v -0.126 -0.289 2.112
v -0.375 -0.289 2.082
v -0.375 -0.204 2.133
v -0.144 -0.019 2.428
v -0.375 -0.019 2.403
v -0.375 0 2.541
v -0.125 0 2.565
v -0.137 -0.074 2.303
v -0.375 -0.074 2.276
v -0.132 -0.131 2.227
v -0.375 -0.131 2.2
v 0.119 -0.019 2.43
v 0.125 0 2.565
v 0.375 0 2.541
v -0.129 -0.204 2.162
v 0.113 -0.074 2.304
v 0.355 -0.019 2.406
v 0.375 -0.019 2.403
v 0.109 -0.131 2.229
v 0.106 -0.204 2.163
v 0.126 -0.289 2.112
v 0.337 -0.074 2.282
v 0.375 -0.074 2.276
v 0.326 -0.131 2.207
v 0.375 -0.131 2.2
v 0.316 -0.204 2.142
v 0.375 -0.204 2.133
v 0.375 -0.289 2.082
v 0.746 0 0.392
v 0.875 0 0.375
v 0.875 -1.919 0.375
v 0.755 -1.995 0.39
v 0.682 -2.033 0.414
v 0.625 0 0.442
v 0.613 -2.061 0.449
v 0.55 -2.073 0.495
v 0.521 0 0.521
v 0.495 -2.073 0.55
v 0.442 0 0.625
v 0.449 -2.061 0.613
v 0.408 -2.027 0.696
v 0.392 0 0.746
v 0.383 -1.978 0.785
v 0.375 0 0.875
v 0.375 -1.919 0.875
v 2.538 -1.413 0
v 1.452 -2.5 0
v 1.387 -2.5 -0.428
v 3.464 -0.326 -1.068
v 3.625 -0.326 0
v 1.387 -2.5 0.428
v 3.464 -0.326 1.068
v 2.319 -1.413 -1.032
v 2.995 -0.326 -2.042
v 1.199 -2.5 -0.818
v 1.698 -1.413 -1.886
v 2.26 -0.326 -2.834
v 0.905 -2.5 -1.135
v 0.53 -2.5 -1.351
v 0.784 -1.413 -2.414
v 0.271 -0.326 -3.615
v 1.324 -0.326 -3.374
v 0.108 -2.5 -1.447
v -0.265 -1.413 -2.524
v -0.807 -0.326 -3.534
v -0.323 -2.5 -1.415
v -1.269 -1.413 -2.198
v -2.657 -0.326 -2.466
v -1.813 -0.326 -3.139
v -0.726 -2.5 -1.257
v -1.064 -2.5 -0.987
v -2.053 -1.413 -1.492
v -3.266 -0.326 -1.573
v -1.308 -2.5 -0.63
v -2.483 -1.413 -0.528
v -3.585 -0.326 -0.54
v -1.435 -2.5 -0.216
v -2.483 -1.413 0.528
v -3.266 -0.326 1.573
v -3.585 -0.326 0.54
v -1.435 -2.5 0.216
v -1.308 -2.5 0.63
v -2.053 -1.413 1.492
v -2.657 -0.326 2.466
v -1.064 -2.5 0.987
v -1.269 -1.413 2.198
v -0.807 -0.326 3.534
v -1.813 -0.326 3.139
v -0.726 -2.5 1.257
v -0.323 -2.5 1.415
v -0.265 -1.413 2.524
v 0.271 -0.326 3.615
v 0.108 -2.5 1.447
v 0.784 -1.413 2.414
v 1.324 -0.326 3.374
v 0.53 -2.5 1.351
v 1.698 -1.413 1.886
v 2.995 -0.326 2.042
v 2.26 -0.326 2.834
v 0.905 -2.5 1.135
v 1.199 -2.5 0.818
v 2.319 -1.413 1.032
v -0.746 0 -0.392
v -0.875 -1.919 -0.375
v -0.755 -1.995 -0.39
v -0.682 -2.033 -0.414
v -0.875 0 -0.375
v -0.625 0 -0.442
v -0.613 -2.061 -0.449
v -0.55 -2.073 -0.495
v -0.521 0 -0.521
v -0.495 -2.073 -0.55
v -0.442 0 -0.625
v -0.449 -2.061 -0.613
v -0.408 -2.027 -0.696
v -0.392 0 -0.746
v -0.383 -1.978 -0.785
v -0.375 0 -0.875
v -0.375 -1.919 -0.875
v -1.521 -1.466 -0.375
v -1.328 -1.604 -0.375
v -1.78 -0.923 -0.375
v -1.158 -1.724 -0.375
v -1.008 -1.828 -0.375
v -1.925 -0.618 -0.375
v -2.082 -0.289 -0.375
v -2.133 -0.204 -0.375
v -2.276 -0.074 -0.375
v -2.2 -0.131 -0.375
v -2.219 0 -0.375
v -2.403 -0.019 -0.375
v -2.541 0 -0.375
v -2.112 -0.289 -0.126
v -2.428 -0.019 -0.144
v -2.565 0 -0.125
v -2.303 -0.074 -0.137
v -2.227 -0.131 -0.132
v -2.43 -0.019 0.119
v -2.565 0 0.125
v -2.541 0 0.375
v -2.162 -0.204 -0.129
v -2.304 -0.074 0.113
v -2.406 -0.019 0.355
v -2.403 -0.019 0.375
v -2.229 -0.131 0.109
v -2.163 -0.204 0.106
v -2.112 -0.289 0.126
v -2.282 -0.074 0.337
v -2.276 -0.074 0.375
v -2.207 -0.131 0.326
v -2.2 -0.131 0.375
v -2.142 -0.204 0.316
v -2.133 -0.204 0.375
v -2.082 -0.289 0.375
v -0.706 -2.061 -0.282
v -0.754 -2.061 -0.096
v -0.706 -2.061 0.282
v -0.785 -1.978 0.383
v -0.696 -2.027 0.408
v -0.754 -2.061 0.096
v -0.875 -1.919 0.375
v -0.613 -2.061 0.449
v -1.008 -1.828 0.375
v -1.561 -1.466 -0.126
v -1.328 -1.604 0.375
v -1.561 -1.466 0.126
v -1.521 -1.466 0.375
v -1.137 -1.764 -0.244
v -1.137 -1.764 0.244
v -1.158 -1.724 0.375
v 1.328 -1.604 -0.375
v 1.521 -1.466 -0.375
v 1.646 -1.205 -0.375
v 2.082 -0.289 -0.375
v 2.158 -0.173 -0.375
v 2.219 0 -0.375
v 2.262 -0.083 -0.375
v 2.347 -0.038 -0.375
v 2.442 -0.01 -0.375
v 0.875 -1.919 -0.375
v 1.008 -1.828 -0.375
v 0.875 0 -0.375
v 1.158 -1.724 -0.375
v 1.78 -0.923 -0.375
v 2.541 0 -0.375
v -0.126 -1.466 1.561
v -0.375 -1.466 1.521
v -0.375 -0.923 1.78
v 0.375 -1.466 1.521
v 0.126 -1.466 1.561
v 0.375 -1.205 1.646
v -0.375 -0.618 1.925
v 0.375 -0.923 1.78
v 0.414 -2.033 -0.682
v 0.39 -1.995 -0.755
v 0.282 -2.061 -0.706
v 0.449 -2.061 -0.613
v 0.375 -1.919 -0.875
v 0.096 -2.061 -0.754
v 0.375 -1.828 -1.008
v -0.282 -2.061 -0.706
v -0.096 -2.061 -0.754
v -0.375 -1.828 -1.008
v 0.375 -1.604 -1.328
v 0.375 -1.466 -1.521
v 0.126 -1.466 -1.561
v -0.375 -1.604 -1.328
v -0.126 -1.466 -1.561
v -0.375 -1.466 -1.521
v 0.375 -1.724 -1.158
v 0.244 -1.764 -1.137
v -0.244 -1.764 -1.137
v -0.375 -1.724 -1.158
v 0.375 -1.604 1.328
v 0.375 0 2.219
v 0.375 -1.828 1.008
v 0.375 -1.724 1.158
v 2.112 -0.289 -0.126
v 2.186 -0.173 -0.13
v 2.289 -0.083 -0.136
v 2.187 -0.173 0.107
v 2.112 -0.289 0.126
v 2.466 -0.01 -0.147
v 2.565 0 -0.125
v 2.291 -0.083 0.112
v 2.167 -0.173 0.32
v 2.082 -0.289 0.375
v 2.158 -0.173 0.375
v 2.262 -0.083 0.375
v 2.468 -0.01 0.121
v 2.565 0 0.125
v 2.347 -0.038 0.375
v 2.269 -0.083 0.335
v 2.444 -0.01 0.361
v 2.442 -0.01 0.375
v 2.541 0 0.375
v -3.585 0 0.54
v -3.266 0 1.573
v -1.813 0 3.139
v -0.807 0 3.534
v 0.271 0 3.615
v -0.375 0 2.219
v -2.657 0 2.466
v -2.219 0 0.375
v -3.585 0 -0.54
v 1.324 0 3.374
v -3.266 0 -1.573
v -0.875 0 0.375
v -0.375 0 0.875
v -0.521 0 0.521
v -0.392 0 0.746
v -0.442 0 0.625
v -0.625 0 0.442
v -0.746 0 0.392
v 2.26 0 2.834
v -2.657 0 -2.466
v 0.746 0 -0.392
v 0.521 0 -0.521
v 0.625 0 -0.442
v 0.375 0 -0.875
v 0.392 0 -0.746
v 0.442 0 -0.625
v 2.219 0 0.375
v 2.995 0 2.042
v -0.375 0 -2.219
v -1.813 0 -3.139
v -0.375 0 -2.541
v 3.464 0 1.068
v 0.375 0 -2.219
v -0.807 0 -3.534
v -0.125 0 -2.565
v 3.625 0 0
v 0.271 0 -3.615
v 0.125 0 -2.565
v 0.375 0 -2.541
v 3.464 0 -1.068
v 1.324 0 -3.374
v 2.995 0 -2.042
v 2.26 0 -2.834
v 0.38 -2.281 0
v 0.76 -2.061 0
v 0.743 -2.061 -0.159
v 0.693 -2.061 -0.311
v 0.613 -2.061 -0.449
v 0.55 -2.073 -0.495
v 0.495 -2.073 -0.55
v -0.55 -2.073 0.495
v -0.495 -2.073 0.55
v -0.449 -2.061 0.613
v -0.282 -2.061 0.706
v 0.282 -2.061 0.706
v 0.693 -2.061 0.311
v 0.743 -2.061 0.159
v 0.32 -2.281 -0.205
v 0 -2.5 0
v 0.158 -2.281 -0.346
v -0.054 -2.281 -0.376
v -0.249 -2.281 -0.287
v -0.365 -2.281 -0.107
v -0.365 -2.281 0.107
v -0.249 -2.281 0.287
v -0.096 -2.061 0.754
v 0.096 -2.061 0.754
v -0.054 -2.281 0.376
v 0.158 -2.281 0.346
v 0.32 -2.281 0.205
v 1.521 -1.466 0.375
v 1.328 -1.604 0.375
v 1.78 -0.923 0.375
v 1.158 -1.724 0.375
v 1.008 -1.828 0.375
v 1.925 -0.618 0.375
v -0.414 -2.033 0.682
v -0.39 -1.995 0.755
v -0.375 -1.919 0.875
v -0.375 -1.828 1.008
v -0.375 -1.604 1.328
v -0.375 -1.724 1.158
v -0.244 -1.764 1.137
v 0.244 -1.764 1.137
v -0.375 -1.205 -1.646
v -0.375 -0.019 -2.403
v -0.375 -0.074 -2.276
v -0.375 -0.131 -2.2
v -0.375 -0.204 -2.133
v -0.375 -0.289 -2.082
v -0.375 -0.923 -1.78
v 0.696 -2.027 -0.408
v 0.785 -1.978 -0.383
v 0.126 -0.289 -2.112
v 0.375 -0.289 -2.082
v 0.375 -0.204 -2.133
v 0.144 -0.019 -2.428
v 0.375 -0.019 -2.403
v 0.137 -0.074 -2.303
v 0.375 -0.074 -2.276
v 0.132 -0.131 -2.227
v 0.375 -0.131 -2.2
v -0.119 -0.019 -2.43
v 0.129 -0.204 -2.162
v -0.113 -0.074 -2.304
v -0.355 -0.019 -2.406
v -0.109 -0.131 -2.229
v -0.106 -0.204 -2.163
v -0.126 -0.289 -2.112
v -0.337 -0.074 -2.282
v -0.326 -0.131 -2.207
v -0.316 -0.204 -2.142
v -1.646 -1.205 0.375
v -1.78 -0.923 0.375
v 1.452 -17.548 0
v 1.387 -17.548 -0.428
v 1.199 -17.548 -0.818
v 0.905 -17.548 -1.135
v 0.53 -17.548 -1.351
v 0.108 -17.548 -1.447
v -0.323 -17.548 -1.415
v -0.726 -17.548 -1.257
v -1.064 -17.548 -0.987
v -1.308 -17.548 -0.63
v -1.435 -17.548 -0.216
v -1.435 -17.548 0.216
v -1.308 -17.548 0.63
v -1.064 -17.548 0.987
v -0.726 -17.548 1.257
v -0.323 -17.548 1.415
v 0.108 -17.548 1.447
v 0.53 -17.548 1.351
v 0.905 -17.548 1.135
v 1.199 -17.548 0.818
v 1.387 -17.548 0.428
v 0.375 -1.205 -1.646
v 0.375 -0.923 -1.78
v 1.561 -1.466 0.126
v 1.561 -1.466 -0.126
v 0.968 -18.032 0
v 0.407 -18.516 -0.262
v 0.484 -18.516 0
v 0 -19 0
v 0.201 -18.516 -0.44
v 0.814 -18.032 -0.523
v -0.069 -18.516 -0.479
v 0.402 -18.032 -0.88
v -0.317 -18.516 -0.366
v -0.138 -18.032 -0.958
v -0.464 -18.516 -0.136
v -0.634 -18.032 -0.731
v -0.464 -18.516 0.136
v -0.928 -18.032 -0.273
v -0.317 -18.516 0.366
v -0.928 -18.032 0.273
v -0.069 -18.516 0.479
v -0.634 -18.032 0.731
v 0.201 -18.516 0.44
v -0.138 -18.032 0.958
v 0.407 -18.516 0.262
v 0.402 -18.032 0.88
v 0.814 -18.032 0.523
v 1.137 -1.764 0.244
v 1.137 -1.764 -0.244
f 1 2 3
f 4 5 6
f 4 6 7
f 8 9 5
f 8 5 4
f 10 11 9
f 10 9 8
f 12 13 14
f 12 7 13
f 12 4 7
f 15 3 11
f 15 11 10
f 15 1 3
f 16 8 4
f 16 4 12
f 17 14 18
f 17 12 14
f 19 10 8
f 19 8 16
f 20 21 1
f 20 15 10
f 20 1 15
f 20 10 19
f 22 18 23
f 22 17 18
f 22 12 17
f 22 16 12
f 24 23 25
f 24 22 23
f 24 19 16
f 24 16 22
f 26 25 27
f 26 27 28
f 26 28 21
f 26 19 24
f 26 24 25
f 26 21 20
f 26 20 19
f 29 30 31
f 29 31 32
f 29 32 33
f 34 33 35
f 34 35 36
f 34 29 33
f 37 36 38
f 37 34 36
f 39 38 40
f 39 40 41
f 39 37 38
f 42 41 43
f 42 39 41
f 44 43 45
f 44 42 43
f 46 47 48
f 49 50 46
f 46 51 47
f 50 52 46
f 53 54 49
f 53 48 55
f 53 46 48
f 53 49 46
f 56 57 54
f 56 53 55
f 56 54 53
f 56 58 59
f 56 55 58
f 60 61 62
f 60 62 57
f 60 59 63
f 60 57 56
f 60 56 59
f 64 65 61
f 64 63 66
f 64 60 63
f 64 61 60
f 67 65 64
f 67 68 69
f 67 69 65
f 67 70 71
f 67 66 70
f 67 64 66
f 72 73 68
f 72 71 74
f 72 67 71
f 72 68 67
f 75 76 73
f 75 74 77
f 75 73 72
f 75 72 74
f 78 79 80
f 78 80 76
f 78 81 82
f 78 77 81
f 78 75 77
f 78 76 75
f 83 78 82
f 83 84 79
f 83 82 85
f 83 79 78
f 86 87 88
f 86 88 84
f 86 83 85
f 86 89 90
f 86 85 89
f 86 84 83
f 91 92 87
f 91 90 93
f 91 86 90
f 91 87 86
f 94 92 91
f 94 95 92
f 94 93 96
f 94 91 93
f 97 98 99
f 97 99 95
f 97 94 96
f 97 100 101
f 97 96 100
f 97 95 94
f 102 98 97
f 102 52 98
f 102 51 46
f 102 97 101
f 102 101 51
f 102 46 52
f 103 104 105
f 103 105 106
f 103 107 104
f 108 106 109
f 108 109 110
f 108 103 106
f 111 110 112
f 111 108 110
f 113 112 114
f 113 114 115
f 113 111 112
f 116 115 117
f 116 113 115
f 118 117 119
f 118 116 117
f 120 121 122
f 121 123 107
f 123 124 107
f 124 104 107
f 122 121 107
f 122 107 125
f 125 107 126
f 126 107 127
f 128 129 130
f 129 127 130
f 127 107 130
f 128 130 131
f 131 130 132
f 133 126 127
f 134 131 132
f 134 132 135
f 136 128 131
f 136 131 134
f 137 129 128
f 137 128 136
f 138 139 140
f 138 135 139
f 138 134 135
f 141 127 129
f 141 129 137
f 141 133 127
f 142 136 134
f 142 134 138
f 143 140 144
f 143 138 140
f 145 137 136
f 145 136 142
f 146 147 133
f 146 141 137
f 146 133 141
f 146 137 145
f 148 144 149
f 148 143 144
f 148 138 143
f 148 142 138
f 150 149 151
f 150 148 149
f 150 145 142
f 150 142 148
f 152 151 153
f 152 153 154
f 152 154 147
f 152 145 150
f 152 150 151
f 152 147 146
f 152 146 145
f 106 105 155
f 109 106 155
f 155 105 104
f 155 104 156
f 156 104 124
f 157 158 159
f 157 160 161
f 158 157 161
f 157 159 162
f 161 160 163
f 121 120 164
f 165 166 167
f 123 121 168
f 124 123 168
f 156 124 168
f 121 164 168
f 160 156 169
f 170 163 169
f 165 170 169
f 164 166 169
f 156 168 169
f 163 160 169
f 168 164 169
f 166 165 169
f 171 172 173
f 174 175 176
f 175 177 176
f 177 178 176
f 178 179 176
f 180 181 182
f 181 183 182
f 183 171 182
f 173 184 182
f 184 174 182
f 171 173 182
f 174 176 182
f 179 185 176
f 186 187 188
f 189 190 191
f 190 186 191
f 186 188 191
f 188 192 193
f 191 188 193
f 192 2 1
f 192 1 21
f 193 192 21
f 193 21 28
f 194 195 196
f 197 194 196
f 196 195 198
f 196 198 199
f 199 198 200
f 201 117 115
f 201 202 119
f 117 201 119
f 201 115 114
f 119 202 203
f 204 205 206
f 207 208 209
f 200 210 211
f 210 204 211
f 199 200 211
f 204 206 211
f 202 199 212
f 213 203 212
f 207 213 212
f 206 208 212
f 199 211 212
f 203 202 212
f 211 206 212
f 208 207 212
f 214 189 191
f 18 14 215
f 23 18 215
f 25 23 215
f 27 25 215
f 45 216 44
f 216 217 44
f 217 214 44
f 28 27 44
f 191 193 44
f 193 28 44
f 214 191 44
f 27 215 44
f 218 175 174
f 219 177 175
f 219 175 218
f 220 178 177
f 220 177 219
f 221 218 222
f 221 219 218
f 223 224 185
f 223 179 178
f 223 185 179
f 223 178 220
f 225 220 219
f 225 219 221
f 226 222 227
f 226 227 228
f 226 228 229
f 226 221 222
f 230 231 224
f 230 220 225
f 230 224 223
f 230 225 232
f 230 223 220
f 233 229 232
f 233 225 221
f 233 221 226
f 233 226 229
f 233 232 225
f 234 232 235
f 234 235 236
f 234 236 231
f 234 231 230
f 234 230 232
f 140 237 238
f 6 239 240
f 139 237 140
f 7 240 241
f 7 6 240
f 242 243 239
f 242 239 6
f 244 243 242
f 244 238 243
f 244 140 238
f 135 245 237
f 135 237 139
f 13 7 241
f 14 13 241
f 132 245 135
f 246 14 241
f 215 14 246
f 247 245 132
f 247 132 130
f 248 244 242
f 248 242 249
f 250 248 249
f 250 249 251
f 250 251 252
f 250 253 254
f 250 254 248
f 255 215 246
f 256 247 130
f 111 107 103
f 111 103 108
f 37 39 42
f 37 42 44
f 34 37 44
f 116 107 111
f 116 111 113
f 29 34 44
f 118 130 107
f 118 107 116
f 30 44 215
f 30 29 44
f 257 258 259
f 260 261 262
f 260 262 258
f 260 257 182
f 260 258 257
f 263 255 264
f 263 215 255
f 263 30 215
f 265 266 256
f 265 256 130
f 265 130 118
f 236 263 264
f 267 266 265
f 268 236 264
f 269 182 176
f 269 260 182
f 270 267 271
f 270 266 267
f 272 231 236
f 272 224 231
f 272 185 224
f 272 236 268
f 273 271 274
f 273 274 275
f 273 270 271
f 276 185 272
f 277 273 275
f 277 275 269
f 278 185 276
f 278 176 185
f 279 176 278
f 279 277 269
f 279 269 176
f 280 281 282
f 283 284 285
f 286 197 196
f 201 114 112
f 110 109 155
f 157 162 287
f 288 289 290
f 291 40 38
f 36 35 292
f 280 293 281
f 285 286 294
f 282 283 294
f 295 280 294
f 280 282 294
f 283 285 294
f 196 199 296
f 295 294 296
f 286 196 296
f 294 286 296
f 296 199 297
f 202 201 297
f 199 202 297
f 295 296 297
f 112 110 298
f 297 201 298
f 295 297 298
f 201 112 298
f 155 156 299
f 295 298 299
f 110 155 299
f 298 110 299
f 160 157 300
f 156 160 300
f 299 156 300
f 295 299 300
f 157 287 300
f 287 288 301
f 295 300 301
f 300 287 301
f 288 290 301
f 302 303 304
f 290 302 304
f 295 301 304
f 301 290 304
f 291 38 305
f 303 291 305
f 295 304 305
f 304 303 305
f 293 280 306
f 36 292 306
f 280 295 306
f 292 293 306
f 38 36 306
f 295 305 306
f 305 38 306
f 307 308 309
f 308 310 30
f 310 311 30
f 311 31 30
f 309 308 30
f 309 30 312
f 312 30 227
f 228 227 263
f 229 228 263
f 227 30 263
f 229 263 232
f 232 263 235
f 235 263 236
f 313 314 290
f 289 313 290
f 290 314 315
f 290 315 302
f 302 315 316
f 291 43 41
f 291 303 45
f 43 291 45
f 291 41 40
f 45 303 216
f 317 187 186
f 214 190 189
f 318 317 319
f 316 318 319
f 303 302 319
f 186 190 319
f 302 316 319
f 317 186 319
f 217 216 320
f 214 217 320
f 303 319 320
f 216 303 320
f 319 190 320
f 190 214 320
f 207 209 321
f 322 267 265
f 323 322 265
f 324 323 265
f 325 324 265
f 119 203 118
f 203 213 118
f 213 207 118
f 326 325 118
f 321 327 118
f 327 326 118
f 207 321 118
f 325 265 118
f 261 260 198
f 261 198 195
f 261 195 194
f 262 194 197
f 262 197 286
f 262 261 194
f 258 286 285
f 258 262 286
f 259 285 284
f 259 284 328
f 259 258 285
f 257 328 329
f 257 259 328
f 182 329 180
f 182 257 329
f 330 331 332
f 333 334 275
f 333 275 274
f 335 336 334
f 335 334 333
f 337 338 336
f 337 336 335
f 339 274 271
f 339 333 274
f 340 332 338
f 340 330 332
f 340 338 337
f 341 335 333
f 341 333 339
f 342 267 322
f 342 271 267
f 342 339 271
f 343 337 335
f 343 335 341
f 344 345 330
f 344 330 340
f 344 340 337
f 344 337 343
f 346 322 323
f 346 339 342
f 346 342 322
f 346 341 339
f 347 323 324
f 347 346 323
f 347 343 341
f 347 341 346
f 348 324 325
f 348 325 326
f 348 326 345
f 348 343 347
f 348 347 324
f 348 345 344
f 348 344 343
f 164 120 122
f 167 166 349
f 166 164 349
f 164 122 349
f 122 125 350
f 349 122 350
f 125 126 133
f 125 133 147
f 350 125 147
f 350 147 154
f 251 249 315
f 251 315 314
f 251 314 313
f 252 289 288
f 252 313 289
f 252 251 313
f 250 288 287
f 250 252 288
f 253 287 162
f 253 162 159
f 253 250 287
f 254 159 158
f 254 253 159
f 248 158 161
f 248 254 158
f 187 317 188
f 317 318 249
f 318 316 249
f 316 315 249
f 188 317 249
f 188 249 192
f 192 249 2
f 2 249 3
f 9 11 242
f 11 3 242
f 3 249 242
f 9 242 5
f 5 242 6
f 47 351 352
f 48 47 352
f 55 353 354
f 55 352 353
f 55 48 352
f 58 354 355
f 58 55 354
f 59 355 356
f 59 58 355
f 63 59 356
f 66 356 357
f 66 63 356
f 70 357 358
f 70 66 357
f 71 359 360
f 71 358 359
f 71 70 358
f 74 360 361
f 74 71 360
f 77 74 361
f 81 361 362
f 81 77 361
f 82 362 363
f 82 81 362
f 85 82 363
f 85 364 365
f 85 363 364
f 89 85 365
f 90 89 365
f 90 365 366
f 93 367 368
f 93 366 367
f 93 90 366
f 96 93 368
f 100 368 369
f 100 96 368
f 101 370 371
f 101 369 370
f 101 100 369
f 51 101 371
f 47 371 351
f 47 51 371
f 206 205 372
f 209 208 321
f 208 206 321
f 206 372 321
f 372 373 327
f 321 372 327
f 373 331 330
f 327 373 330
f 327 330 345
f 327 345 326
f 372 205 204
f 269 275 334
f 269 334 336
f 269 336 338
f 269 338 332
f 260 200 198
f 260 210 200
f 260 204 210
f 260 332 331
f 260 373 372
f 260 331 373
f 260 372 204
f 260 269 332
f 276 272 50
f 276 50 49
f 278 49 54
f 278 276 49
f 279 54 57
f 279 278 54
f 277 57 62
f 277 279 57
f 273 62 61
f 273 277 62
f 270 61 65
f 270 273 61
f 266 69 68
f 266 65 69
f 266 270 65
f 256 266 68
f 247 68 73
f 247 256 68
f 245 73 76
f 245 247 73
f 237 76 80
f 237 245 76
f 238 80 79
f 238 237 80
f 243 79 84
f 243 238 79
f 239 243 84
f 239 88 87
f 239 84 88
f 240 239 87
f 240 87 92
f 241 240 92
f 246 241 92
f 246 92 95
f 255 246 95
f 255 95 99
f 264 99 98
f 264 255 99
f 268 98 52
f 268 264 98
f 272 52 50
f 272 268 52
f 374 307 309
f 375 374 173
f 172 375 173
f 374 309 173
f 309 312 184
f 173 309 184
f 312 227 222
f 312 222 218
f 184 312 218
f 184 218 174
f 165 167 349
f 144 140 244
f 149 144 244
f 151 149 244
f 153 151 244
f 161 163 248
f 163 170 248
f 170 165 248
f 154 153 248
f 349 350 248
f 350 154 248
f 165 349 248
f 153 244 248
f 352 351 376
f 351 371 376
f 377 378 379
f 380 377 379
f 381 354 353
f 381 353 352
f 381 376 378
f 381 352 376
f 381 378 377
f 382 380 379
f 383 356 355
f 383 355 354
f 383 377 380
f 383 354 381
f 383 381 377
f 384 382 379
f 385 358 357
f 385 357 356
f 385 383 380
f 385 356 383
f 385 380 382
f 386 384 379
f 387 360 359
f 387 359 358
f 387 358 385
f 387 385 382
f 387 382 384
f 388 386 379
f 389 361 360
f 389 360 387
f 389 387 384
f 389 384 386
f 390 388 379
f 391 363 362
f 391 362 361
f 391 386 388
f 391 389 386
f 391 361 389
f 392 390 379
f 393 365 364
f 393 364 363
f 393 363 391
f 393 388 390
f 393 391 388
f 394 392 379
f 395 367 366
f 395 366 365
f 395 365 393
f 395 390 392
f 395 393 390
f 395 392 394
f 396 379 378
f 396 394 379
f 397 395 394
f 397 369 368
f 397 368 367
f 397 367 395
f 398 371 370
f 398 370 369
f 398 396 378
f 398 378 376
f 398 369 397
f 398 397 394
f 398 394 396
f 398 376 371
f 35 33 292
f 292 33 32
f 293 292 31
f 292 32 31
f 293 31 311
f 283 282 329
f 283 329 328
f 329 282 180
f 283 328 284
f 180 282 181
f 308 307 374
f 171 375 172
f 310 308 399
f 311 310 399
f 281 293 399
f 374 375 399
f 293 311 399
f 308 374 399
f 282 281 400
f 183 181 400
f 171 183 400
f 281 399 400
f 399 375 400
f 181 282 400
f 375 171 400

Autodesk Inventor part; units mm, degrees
ref_plane "YZ Plane" through (0, 0, 0) normal (1, 0, 0) x (0, 1, 0)
ref_plane "XZ Plane" through (0, 0, 0) normal (0, 1, 0) x (-1, 0, 0)
ref_plane "XY Plane" through (0, 0, 0) normal (0, 0, 1) x (1, 0, 0)
sketch "Sketch1" plane through (0, 0, 0) normal (0, 0, 1) x (1, 0, 0)
  line L0 (0, -2.5) -> (0, -19)
  line L1 (0, -19) -> (1.4515, -17.5485)
  line L2 (1.4515, -17.5485) -> (1.4515, -2.5)
  line L3 (1.4515, -2.5) -> (3.625, -0.3265)
  line L4 (3.625, -0.3265) -> (3.625, 0)
  line L5 (3.625, 0) -> (2.25, 0)
  line L6 (0.7598, -2.0613) -> (0, -2.5)
  line L7 (0.7598, -2.0613) -> (1.5664, -1.466)
  line L8 (1.5664, -1.466) -> (2.25, 0)
  point P0 (0, 0)
  dimension "d0" = 3.625
  dimension "d1" = 2.25
  dimension "d2" = 19
  dimension "d3" = 60
  dimension "d4" = 45
  dimension "d5" = 2.5
  dimension "d6" = 2.5
  dimension "d7" = 25
revolve "Revolution1" add sketch "Sketch1" angle 360 about axis through (0, -2.5, 0) along (0, -1, 0)
sketch "Sketch2" plane through (0, 0, 0) normal (0, 1, 0) x (1, 0, 0)
  circle A0 centre (0, 0) radius 2.25 projected
  line L0 (0, 2.25) -> (0.375, 2.25)
  line L1 (0.375, 2.25) -> (-0.375, 2.25)
  line L2 (-0.375, 2.25) -> (-0.375, 0.875)
  line L3 (-0.875, 0.375) -> (-2.25, 0.375)
  line L4 (-2.25, 0.375) -> (-2.25, -0.375)
  line L5 (-2.25, -0.375) -> (-0.875, -0.375)
  line L6 (-0.375, -0.875) -> (-0.375, -2.25)
  line L7 (-0.375, -2.25) -> (0.375, -2.25)
  line L8 (0.375, -2.25) -> (0.375, -0.875)
  line L9 (0.875, -0.375) -> (2.25, -0.375)
  line L10 (2.25, -0.375) -> (2.25, 0.375)
  line L11 (2.25, 0.375) -> (0.875, 0.375)
  line L12 (0.375, 2.25) -> (0.375, 0.875)
  arc A1 (0.375, 0.875) -> (0.875, 0.375) centre (0.875, 0.875) ccw
  arc A2 (0.875, -0.375) -> (0.375, -0.875) centre (0.875, -0.875) ccw
  arc A3 (-0.375, -0.875) -> (-0.875, -0.375) centre (-0.875, -0.875) ccw
  arc A4 (-0.875, 0.375) -> (-0.375, 0.875) centre (-0.875, 0.875) ccw
  point P0 (0, 0)
  point P1 (-0.375, 0.375)
  point P2 (-0.375, -0.375)
  point P3 (0.375, -0.375)
  point P4 (0.375, 0.375)
  point P5 (-2.2185, -0.375)
  point P6 (-0.375, -2.2185)
  point P7 (0.375, -2.2185)
  point P8 (2.2185, -0.375)
  point P9 (2.2185, 0.375)
  point P10 (0.375, 2.2185)
  point P11 (-0.375, 2.2185)
  point P12 (-2.2185, 0.375)
  dimension "d9" = 0.375
  dimension "d10" = 0.75
  dimension "d11" = 1.875
  dimension "d12" = 1.875
  dimension "d13" = 0.75
  dimension "d14" = 1.875
  dimension "d15" = 1.875
  dimension "d16" = 0.5
extrude "Extrusion1" add sketch "Sketch2" against normal up to next contours L11 A1 L12 A0 | A0 L8 A2 L9 | L2 A4 L3 A0 | A0 L5 A3 L6
fillet "Fillet1" radius 0.5 4 edges at (-2.25, 0, 0) (0, 0, 2.25) (2.25, 0, 0) (0, 0, -2.25)
properties part number "screw EE" material "Iron, Malleable"
